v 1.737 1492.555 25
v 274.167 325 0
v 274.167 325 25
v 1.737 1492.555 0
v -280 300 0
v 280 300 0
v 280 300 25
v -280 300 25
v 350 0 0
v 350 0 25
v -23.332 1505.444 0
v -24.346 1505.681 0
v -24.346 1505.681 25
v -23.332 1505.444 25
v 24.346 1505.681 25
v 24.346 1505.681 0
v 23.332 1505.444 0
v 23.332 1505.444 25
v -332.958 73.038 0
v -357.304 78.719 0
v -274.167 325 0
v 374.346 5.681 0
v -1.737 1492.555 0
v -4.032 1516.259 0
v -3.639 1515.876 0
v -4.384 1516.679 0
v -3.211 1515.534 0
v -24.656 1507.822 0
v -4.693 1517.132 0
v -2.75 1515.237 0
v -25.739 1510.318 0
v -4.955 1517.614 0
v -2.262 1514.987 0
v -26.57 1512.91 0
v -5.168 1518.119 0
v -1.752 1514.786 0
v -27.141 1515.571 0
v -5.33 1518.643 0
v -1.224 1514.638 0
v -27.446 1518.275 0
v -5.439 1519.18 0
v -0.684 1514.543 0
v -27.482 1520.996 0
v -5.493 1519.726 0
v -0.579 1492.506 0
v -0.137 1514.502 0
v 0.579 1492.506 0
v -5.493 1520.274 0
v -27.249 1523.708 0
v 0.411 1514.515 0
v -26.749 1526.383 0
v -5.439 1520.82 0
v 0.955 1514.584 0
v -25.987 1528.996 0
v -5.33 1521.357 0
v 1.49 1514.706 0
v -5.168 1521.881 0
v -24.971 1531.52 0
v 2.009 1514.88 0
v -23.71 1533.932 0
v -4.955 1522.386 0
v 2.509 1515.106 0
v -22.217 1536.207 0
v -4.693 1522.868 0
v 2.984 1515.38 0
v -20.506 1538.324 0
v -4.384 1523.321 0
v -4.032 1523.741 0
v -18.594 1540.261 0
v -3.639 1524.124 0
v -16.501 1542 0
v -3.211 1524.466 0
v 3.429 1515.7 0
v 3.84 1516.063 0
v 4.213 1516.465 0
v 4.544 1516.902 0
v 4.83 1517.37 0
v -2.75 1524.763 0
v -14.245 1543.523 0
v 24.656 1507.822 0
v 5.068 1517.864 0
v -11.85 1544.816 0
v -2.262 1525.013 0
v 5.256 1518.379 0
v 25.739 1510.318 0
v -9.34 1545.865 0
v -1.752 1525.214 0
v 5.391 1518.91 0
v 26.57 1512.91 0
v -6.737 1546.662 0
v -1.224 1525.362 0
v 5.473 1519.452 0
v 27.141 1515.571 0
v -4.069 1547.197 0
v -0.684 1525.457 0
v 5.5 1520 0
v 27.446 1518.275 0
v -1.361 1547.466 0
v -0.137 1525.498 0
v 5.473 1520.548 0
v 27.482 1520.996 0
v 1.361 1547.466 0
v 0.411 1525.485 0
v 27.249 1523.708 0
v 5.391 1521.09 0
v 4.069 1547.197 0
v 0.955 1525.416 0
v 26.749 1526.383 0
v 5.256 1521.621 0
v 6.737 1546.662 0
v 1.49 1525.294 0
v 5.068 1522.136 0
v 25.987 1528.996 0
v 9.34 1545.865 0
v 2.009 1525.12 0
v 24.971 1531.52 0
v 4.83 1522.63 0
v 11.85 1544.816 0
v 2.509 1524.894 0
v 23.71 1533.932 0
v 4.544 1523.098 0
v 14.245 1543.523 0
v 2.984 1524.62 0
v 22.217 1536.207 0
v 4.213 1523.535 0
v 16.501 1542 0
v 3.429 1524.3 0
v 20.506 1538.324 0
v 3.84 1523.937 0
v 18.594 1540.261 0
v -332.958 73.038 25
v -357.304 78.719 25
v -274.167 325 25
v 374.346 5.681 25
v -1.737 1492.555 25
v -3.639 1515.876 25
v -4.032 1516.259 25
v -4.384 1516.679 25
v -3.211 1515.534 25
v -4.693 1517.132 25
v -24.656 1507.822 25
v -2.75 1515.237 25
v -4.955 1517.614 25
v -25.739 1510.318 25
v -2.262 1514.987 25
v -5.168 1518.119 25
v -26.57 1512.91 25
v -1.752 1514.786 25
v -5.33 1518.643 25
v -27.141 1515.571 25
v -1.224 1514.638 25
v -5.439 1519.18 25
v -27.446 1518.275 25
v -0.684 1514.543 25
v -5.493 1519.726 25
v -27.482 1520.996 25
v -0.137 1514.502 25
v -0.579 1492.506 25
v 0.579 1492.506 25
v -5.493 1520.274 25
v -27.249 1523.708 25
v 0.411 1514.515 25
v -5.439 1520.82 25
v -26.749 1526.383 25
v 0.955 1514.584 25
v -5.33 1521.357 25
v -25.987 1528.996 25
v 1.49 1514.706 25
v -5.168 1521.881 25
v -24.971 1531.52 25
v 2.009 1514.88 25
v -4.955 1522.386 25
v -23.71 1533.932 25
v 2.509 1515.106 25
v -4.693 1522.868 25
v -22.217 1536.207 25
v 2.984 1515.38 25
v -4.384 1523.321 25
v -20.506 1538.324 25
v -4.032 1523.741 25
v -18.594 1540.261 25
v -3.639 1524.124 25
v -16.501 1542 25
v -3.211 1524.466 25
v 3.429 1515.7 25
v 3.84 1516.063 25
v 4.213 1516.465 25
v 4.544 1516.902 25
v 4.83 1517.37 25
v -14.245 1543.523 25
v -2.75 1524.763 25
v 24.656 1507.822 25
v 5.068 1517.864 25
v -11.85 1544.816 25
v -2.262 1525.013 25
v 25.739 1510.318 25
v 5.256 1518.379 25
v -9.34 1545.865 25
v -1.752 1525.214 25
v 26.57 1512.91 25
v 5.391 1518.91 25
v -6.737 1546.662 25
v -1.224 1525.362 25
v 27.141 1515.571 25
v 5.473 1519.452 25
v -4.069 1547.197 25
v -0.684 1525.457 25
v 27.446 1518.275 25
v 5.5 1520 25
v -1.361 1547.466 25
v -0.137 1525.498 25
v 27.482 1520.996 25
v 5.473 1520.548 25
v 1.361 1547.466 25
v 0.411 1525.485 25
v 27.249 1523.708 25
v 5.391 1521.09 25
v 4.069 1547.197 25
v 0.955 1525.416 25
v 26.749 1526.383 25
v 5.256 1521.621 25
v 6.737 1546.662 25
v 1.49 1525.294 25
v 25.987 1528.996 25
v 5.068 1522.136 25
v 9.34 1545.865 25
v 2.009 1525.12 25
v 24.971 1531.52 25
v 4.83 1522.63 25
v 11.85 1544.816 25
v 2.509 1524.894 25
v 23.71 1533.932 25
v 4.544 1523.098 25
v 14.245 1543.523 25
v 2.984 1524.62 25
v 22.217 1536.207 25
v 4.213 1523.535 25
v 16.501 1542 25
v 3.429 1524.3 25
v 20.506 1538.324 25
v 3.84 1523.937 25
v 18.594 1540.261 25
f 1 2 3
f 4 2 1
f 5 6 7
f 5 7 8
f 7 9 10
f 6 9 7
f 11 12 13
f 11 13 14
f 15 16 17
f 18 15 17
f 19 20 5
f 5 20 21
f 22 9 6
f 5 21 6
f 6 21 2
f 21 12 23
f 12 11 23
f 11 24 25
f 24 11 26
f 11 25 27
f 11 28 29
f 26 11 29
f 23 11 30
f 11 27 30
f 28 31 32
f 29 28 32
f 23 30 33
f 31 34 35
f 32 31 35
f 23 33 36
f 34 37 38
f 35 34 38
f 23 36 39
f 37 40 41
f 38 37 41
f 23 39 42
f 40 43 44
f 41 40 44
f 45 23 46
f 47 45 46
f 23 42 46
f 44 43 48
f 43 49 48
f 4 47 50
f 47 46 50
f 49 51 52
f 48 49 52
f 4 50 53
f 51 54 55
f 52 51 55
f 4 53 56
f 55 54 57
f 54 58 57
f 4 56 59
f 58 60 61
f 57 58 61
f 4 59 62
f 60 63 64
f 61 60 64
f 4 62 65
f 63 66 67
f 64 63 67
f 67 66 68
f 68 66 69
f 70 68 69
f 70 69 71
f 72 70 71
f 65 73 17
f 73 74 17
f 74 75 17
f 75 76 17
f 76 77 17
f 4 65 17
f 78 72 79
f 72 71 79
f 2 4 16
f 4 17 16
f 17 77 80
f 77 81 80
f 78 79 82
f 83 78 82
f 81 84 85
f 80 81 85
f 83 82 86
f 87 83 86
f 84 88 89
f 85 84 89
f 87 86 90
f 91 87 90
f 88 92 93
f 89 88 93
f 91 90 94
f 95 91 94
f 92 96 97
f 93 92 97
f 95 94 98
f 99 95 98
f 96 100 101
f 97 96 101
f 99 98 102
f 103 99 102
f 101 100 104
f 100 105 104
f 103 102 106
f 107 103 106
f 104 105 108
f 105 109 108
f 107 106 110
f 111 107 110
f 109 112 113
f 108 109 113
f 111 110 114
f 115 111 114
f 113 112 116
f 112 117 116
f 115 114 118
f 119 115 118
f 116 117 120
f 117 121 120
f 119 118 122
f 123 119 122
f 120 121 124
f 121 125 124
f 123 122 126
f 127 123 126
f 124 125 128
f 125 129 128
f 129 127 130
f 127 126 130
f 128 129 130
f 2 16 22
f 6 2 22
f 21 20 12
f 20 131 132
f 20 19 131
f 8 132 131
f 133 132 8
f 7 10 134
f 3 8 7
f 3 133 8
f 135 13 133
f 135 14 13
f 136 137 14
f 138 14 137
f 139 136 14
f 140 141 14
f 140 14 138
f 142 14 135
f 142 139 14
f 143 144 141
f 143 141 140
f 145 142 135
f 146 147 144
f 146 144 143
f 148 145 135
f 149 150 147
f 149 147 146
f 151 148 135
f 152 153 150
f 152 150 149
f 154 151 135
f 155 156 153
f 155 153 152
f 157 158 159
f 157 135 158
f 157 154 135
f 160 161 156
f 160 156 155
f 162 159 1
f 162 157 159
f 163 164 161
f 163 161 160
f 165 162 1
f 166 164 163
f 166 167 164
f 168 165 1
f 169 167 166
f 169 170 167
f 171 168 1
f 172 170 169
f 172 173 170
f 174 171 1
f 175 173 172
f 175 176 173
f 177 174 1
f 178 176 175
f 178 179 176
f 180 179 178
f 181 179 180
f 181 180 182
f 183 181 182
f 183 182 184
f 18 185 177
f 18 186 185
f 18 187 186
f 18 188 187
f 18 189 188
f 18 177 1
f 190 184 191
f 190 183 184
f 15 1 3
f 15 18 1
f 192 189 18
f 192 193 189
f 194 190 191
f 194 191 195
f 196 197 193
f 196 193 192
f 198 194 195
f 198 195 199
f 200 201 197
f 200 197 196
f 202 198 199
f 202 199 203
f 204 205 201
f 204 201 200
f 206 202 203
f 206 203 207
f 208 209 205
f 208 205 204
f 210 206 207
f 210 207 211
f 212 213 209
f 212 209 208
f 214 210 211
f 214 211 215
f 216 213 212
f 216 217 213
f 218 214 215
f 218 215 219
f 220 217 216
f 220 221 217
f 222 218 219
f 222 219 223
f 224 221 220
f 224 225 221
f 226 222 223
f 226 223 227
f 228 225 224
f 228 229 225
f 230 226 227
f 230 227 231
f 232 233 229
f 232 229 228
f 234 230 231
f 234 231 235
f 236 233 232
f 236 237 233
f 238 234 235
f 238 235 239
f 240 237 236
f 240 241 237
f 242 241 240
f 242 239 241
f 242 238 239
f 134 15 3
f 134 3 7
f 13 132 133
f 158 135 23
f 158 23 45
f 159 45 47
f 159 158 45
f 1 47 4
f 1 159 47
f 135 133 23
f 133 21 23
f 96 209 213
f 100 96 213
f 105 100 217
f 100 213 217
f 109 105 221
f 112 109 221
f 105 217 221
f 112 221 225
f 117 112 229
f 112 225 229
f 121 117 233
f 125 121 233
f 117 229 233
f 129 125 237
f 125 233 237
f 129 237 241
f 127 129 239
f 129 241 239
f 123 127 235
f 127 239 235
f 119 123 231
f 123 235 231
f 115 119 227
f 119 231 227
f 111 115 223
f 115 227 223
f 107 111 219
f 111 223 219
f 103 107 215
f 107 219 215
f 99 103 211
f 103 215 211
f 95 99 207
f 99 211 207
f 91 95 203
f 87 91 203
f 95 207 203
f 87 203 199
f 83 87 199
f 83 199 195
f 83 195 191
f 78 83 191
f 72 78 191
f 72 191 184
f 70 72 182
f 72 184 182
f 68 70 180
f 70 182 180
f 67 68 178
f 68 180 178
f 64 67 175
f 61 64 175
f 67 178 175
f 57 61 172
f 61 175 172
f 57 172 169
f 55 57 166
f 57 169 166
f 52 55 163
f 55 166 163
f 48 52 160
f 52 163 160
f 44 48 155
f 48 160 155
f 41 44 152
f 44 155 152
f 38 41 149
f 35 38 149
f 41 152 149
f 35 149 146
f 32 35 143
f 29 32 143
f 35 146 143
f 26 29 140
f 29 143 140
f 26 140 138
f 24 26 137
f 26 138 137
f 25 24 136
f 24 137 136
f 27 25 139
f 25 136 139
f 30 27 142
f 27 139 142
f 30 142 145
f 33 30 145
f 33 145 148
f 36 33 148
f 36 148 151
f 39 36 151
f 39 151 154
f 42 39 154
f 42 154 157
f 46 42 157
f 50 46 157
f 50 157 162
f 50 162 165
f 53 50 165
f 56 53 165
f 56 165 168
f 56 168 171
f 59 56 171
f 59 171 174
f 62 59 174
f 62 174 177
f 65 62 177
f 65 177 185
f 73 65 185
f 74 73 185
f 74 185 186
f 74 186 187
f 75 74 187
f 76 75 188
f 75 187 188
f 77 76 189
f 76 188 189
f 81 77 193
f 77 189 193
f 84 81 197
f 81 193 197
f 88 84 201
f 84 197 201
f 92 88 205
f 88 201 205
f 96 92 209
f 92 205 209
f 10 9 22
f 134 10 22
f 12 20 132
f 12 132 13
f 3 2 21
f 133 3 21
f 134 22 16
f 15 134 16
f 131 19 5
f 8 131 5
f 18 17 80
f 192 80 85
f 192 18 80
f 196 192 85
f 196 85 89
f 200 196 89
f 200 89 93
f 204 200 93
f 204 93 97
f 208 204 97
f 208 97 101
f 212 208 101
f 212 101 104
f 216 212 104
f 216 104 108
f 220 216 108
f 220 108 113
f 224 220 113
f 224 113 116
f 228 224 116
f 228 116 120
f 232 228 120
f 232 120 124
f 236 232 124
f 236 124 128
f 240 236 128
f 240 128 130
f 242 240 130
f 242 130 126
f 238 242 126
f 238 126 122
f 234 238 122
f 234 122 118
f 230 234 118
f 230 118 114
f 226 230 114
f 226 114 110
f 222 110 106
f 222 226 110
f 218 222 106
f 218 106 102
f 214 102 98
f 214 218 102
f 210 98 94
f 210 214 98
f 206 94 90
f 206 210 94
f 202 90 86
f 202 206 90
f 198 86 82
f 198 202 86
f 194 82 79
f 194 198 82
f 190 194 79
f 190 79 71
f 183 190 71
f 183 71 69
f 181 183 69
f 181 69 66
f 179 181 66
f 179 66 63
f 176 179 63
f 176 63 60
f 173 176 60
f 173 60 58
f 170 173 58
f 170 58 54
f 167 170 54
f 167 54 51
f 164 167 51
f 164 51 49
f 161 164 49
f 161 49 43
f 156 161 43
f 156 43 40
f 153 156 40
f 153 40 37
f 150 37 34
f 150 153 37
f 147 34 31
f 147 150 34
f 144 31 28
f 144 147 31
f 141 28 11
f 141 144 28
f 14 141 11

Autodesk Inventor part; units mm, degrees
ref_plane "YZ Plane" through (0, 0, 0) normal (1, 0, 0) x (0, 1, 0)
ref_plane "XZ Plane" through (0, 0, 0) normal (0, 1, 0) x (-1, 0, 0)
ref_plane "XY Plane" through (0, 0, 0) normal (0, 0, 1) x (1, 0, 0)
sketch "Skizze1" plane through (0, 0, 0) normal (0, 0, 1) x (1, 0, 0)
  line L0 (-523.9247, 0) -> (524.0578, 0) projected
  line L1 (0, -301.1361) -> (0, 1806.8169) projected
  line L2 (350, 0) -> (-350, 0) construction
  line L3 (-350, 0) -> (-374.2129, 6.2512)
  line L4 (-374.2129, 6.2512) -> (-24.346, 1505.6807)
  line L5 (-24.346, 1505.6807) -> (0, 1500)
  line L6 (350, 0) -> (374.346, 5.6807)
  line L7 (374.346, 5.6807) -> (24.346, 1505.6807)
  line L8 (24.346, 1505.6807) -> (0, 1500)
  line L9 (280, 300) -> (-280, 300)
  line L10 (274.1667, 325) -> (-274.1667, 325)
  line L11 (350, 0) -> (280, 300)
  line L12 (274.1667, 325) -> (0, 1500)
  line L13 (-350, 0) -> (-280, 300)
  line L14 (-274.1667, 325) -> (0, 1500)
  point P0 (0, 0)
  point P1 (0, 300)
  dimension "d9" = 700
  dimension "d11" = 300
  dimension "d18" = 1500
  dimension "d19" = 25
extrude "Extrusion2" add sketch "Skizze1" along normal blind 25 contours L3 L4 L5 L14 L10 L1 L9 L13 | L11 L9 L1 L10 L12 L8 L7 L6 | L10 L14 L1 | L1 L12 L10
extrude "Extrusion3" cut sketch "Skizze1" along normal through all contours L10 L14 L1 | L1 L12 L10
sketch "Skizze2" plane through (0, 0, 25) normal (0, 0, 1) x (1, 0, 0)
  circle A0 centre (0, 1520) radius 27.5
  circle A1 centre (0, 1520) radius 5.5
  line L0 (-274.1667, 325) -> (0, 1500) projected
  line L1 (0, 1500) -> (274.1667, 325) projected
  point P0 (0, 0)
  dimension "d38" = 55
  dimension "d39" = 1520
  dimension "d40" = 11
extrude "Extrusion4" add sketch "Skizze2" against normal blind 25
sketch "Skizze3" plane through (0, 0, 0) normal (0, 0, -1) x (-1, 0, 0)
  line L0 (24.346, 1505.6807) -> (374.2129, 6.2512) projected
  line L1 (350, 0) -> (280, 300) projected
  line L2 (374.2129, 6.2512) -> (350, 0) projected
  line L3 (332.9578, 73.0381) -> (357.3038, 78.7188)
  point P0 (0, 0)
  dimension "d44" = 75
extrude "Extrusion5" cut sketch "Skizze3" against normal blind 25
properties part number "Steher"
